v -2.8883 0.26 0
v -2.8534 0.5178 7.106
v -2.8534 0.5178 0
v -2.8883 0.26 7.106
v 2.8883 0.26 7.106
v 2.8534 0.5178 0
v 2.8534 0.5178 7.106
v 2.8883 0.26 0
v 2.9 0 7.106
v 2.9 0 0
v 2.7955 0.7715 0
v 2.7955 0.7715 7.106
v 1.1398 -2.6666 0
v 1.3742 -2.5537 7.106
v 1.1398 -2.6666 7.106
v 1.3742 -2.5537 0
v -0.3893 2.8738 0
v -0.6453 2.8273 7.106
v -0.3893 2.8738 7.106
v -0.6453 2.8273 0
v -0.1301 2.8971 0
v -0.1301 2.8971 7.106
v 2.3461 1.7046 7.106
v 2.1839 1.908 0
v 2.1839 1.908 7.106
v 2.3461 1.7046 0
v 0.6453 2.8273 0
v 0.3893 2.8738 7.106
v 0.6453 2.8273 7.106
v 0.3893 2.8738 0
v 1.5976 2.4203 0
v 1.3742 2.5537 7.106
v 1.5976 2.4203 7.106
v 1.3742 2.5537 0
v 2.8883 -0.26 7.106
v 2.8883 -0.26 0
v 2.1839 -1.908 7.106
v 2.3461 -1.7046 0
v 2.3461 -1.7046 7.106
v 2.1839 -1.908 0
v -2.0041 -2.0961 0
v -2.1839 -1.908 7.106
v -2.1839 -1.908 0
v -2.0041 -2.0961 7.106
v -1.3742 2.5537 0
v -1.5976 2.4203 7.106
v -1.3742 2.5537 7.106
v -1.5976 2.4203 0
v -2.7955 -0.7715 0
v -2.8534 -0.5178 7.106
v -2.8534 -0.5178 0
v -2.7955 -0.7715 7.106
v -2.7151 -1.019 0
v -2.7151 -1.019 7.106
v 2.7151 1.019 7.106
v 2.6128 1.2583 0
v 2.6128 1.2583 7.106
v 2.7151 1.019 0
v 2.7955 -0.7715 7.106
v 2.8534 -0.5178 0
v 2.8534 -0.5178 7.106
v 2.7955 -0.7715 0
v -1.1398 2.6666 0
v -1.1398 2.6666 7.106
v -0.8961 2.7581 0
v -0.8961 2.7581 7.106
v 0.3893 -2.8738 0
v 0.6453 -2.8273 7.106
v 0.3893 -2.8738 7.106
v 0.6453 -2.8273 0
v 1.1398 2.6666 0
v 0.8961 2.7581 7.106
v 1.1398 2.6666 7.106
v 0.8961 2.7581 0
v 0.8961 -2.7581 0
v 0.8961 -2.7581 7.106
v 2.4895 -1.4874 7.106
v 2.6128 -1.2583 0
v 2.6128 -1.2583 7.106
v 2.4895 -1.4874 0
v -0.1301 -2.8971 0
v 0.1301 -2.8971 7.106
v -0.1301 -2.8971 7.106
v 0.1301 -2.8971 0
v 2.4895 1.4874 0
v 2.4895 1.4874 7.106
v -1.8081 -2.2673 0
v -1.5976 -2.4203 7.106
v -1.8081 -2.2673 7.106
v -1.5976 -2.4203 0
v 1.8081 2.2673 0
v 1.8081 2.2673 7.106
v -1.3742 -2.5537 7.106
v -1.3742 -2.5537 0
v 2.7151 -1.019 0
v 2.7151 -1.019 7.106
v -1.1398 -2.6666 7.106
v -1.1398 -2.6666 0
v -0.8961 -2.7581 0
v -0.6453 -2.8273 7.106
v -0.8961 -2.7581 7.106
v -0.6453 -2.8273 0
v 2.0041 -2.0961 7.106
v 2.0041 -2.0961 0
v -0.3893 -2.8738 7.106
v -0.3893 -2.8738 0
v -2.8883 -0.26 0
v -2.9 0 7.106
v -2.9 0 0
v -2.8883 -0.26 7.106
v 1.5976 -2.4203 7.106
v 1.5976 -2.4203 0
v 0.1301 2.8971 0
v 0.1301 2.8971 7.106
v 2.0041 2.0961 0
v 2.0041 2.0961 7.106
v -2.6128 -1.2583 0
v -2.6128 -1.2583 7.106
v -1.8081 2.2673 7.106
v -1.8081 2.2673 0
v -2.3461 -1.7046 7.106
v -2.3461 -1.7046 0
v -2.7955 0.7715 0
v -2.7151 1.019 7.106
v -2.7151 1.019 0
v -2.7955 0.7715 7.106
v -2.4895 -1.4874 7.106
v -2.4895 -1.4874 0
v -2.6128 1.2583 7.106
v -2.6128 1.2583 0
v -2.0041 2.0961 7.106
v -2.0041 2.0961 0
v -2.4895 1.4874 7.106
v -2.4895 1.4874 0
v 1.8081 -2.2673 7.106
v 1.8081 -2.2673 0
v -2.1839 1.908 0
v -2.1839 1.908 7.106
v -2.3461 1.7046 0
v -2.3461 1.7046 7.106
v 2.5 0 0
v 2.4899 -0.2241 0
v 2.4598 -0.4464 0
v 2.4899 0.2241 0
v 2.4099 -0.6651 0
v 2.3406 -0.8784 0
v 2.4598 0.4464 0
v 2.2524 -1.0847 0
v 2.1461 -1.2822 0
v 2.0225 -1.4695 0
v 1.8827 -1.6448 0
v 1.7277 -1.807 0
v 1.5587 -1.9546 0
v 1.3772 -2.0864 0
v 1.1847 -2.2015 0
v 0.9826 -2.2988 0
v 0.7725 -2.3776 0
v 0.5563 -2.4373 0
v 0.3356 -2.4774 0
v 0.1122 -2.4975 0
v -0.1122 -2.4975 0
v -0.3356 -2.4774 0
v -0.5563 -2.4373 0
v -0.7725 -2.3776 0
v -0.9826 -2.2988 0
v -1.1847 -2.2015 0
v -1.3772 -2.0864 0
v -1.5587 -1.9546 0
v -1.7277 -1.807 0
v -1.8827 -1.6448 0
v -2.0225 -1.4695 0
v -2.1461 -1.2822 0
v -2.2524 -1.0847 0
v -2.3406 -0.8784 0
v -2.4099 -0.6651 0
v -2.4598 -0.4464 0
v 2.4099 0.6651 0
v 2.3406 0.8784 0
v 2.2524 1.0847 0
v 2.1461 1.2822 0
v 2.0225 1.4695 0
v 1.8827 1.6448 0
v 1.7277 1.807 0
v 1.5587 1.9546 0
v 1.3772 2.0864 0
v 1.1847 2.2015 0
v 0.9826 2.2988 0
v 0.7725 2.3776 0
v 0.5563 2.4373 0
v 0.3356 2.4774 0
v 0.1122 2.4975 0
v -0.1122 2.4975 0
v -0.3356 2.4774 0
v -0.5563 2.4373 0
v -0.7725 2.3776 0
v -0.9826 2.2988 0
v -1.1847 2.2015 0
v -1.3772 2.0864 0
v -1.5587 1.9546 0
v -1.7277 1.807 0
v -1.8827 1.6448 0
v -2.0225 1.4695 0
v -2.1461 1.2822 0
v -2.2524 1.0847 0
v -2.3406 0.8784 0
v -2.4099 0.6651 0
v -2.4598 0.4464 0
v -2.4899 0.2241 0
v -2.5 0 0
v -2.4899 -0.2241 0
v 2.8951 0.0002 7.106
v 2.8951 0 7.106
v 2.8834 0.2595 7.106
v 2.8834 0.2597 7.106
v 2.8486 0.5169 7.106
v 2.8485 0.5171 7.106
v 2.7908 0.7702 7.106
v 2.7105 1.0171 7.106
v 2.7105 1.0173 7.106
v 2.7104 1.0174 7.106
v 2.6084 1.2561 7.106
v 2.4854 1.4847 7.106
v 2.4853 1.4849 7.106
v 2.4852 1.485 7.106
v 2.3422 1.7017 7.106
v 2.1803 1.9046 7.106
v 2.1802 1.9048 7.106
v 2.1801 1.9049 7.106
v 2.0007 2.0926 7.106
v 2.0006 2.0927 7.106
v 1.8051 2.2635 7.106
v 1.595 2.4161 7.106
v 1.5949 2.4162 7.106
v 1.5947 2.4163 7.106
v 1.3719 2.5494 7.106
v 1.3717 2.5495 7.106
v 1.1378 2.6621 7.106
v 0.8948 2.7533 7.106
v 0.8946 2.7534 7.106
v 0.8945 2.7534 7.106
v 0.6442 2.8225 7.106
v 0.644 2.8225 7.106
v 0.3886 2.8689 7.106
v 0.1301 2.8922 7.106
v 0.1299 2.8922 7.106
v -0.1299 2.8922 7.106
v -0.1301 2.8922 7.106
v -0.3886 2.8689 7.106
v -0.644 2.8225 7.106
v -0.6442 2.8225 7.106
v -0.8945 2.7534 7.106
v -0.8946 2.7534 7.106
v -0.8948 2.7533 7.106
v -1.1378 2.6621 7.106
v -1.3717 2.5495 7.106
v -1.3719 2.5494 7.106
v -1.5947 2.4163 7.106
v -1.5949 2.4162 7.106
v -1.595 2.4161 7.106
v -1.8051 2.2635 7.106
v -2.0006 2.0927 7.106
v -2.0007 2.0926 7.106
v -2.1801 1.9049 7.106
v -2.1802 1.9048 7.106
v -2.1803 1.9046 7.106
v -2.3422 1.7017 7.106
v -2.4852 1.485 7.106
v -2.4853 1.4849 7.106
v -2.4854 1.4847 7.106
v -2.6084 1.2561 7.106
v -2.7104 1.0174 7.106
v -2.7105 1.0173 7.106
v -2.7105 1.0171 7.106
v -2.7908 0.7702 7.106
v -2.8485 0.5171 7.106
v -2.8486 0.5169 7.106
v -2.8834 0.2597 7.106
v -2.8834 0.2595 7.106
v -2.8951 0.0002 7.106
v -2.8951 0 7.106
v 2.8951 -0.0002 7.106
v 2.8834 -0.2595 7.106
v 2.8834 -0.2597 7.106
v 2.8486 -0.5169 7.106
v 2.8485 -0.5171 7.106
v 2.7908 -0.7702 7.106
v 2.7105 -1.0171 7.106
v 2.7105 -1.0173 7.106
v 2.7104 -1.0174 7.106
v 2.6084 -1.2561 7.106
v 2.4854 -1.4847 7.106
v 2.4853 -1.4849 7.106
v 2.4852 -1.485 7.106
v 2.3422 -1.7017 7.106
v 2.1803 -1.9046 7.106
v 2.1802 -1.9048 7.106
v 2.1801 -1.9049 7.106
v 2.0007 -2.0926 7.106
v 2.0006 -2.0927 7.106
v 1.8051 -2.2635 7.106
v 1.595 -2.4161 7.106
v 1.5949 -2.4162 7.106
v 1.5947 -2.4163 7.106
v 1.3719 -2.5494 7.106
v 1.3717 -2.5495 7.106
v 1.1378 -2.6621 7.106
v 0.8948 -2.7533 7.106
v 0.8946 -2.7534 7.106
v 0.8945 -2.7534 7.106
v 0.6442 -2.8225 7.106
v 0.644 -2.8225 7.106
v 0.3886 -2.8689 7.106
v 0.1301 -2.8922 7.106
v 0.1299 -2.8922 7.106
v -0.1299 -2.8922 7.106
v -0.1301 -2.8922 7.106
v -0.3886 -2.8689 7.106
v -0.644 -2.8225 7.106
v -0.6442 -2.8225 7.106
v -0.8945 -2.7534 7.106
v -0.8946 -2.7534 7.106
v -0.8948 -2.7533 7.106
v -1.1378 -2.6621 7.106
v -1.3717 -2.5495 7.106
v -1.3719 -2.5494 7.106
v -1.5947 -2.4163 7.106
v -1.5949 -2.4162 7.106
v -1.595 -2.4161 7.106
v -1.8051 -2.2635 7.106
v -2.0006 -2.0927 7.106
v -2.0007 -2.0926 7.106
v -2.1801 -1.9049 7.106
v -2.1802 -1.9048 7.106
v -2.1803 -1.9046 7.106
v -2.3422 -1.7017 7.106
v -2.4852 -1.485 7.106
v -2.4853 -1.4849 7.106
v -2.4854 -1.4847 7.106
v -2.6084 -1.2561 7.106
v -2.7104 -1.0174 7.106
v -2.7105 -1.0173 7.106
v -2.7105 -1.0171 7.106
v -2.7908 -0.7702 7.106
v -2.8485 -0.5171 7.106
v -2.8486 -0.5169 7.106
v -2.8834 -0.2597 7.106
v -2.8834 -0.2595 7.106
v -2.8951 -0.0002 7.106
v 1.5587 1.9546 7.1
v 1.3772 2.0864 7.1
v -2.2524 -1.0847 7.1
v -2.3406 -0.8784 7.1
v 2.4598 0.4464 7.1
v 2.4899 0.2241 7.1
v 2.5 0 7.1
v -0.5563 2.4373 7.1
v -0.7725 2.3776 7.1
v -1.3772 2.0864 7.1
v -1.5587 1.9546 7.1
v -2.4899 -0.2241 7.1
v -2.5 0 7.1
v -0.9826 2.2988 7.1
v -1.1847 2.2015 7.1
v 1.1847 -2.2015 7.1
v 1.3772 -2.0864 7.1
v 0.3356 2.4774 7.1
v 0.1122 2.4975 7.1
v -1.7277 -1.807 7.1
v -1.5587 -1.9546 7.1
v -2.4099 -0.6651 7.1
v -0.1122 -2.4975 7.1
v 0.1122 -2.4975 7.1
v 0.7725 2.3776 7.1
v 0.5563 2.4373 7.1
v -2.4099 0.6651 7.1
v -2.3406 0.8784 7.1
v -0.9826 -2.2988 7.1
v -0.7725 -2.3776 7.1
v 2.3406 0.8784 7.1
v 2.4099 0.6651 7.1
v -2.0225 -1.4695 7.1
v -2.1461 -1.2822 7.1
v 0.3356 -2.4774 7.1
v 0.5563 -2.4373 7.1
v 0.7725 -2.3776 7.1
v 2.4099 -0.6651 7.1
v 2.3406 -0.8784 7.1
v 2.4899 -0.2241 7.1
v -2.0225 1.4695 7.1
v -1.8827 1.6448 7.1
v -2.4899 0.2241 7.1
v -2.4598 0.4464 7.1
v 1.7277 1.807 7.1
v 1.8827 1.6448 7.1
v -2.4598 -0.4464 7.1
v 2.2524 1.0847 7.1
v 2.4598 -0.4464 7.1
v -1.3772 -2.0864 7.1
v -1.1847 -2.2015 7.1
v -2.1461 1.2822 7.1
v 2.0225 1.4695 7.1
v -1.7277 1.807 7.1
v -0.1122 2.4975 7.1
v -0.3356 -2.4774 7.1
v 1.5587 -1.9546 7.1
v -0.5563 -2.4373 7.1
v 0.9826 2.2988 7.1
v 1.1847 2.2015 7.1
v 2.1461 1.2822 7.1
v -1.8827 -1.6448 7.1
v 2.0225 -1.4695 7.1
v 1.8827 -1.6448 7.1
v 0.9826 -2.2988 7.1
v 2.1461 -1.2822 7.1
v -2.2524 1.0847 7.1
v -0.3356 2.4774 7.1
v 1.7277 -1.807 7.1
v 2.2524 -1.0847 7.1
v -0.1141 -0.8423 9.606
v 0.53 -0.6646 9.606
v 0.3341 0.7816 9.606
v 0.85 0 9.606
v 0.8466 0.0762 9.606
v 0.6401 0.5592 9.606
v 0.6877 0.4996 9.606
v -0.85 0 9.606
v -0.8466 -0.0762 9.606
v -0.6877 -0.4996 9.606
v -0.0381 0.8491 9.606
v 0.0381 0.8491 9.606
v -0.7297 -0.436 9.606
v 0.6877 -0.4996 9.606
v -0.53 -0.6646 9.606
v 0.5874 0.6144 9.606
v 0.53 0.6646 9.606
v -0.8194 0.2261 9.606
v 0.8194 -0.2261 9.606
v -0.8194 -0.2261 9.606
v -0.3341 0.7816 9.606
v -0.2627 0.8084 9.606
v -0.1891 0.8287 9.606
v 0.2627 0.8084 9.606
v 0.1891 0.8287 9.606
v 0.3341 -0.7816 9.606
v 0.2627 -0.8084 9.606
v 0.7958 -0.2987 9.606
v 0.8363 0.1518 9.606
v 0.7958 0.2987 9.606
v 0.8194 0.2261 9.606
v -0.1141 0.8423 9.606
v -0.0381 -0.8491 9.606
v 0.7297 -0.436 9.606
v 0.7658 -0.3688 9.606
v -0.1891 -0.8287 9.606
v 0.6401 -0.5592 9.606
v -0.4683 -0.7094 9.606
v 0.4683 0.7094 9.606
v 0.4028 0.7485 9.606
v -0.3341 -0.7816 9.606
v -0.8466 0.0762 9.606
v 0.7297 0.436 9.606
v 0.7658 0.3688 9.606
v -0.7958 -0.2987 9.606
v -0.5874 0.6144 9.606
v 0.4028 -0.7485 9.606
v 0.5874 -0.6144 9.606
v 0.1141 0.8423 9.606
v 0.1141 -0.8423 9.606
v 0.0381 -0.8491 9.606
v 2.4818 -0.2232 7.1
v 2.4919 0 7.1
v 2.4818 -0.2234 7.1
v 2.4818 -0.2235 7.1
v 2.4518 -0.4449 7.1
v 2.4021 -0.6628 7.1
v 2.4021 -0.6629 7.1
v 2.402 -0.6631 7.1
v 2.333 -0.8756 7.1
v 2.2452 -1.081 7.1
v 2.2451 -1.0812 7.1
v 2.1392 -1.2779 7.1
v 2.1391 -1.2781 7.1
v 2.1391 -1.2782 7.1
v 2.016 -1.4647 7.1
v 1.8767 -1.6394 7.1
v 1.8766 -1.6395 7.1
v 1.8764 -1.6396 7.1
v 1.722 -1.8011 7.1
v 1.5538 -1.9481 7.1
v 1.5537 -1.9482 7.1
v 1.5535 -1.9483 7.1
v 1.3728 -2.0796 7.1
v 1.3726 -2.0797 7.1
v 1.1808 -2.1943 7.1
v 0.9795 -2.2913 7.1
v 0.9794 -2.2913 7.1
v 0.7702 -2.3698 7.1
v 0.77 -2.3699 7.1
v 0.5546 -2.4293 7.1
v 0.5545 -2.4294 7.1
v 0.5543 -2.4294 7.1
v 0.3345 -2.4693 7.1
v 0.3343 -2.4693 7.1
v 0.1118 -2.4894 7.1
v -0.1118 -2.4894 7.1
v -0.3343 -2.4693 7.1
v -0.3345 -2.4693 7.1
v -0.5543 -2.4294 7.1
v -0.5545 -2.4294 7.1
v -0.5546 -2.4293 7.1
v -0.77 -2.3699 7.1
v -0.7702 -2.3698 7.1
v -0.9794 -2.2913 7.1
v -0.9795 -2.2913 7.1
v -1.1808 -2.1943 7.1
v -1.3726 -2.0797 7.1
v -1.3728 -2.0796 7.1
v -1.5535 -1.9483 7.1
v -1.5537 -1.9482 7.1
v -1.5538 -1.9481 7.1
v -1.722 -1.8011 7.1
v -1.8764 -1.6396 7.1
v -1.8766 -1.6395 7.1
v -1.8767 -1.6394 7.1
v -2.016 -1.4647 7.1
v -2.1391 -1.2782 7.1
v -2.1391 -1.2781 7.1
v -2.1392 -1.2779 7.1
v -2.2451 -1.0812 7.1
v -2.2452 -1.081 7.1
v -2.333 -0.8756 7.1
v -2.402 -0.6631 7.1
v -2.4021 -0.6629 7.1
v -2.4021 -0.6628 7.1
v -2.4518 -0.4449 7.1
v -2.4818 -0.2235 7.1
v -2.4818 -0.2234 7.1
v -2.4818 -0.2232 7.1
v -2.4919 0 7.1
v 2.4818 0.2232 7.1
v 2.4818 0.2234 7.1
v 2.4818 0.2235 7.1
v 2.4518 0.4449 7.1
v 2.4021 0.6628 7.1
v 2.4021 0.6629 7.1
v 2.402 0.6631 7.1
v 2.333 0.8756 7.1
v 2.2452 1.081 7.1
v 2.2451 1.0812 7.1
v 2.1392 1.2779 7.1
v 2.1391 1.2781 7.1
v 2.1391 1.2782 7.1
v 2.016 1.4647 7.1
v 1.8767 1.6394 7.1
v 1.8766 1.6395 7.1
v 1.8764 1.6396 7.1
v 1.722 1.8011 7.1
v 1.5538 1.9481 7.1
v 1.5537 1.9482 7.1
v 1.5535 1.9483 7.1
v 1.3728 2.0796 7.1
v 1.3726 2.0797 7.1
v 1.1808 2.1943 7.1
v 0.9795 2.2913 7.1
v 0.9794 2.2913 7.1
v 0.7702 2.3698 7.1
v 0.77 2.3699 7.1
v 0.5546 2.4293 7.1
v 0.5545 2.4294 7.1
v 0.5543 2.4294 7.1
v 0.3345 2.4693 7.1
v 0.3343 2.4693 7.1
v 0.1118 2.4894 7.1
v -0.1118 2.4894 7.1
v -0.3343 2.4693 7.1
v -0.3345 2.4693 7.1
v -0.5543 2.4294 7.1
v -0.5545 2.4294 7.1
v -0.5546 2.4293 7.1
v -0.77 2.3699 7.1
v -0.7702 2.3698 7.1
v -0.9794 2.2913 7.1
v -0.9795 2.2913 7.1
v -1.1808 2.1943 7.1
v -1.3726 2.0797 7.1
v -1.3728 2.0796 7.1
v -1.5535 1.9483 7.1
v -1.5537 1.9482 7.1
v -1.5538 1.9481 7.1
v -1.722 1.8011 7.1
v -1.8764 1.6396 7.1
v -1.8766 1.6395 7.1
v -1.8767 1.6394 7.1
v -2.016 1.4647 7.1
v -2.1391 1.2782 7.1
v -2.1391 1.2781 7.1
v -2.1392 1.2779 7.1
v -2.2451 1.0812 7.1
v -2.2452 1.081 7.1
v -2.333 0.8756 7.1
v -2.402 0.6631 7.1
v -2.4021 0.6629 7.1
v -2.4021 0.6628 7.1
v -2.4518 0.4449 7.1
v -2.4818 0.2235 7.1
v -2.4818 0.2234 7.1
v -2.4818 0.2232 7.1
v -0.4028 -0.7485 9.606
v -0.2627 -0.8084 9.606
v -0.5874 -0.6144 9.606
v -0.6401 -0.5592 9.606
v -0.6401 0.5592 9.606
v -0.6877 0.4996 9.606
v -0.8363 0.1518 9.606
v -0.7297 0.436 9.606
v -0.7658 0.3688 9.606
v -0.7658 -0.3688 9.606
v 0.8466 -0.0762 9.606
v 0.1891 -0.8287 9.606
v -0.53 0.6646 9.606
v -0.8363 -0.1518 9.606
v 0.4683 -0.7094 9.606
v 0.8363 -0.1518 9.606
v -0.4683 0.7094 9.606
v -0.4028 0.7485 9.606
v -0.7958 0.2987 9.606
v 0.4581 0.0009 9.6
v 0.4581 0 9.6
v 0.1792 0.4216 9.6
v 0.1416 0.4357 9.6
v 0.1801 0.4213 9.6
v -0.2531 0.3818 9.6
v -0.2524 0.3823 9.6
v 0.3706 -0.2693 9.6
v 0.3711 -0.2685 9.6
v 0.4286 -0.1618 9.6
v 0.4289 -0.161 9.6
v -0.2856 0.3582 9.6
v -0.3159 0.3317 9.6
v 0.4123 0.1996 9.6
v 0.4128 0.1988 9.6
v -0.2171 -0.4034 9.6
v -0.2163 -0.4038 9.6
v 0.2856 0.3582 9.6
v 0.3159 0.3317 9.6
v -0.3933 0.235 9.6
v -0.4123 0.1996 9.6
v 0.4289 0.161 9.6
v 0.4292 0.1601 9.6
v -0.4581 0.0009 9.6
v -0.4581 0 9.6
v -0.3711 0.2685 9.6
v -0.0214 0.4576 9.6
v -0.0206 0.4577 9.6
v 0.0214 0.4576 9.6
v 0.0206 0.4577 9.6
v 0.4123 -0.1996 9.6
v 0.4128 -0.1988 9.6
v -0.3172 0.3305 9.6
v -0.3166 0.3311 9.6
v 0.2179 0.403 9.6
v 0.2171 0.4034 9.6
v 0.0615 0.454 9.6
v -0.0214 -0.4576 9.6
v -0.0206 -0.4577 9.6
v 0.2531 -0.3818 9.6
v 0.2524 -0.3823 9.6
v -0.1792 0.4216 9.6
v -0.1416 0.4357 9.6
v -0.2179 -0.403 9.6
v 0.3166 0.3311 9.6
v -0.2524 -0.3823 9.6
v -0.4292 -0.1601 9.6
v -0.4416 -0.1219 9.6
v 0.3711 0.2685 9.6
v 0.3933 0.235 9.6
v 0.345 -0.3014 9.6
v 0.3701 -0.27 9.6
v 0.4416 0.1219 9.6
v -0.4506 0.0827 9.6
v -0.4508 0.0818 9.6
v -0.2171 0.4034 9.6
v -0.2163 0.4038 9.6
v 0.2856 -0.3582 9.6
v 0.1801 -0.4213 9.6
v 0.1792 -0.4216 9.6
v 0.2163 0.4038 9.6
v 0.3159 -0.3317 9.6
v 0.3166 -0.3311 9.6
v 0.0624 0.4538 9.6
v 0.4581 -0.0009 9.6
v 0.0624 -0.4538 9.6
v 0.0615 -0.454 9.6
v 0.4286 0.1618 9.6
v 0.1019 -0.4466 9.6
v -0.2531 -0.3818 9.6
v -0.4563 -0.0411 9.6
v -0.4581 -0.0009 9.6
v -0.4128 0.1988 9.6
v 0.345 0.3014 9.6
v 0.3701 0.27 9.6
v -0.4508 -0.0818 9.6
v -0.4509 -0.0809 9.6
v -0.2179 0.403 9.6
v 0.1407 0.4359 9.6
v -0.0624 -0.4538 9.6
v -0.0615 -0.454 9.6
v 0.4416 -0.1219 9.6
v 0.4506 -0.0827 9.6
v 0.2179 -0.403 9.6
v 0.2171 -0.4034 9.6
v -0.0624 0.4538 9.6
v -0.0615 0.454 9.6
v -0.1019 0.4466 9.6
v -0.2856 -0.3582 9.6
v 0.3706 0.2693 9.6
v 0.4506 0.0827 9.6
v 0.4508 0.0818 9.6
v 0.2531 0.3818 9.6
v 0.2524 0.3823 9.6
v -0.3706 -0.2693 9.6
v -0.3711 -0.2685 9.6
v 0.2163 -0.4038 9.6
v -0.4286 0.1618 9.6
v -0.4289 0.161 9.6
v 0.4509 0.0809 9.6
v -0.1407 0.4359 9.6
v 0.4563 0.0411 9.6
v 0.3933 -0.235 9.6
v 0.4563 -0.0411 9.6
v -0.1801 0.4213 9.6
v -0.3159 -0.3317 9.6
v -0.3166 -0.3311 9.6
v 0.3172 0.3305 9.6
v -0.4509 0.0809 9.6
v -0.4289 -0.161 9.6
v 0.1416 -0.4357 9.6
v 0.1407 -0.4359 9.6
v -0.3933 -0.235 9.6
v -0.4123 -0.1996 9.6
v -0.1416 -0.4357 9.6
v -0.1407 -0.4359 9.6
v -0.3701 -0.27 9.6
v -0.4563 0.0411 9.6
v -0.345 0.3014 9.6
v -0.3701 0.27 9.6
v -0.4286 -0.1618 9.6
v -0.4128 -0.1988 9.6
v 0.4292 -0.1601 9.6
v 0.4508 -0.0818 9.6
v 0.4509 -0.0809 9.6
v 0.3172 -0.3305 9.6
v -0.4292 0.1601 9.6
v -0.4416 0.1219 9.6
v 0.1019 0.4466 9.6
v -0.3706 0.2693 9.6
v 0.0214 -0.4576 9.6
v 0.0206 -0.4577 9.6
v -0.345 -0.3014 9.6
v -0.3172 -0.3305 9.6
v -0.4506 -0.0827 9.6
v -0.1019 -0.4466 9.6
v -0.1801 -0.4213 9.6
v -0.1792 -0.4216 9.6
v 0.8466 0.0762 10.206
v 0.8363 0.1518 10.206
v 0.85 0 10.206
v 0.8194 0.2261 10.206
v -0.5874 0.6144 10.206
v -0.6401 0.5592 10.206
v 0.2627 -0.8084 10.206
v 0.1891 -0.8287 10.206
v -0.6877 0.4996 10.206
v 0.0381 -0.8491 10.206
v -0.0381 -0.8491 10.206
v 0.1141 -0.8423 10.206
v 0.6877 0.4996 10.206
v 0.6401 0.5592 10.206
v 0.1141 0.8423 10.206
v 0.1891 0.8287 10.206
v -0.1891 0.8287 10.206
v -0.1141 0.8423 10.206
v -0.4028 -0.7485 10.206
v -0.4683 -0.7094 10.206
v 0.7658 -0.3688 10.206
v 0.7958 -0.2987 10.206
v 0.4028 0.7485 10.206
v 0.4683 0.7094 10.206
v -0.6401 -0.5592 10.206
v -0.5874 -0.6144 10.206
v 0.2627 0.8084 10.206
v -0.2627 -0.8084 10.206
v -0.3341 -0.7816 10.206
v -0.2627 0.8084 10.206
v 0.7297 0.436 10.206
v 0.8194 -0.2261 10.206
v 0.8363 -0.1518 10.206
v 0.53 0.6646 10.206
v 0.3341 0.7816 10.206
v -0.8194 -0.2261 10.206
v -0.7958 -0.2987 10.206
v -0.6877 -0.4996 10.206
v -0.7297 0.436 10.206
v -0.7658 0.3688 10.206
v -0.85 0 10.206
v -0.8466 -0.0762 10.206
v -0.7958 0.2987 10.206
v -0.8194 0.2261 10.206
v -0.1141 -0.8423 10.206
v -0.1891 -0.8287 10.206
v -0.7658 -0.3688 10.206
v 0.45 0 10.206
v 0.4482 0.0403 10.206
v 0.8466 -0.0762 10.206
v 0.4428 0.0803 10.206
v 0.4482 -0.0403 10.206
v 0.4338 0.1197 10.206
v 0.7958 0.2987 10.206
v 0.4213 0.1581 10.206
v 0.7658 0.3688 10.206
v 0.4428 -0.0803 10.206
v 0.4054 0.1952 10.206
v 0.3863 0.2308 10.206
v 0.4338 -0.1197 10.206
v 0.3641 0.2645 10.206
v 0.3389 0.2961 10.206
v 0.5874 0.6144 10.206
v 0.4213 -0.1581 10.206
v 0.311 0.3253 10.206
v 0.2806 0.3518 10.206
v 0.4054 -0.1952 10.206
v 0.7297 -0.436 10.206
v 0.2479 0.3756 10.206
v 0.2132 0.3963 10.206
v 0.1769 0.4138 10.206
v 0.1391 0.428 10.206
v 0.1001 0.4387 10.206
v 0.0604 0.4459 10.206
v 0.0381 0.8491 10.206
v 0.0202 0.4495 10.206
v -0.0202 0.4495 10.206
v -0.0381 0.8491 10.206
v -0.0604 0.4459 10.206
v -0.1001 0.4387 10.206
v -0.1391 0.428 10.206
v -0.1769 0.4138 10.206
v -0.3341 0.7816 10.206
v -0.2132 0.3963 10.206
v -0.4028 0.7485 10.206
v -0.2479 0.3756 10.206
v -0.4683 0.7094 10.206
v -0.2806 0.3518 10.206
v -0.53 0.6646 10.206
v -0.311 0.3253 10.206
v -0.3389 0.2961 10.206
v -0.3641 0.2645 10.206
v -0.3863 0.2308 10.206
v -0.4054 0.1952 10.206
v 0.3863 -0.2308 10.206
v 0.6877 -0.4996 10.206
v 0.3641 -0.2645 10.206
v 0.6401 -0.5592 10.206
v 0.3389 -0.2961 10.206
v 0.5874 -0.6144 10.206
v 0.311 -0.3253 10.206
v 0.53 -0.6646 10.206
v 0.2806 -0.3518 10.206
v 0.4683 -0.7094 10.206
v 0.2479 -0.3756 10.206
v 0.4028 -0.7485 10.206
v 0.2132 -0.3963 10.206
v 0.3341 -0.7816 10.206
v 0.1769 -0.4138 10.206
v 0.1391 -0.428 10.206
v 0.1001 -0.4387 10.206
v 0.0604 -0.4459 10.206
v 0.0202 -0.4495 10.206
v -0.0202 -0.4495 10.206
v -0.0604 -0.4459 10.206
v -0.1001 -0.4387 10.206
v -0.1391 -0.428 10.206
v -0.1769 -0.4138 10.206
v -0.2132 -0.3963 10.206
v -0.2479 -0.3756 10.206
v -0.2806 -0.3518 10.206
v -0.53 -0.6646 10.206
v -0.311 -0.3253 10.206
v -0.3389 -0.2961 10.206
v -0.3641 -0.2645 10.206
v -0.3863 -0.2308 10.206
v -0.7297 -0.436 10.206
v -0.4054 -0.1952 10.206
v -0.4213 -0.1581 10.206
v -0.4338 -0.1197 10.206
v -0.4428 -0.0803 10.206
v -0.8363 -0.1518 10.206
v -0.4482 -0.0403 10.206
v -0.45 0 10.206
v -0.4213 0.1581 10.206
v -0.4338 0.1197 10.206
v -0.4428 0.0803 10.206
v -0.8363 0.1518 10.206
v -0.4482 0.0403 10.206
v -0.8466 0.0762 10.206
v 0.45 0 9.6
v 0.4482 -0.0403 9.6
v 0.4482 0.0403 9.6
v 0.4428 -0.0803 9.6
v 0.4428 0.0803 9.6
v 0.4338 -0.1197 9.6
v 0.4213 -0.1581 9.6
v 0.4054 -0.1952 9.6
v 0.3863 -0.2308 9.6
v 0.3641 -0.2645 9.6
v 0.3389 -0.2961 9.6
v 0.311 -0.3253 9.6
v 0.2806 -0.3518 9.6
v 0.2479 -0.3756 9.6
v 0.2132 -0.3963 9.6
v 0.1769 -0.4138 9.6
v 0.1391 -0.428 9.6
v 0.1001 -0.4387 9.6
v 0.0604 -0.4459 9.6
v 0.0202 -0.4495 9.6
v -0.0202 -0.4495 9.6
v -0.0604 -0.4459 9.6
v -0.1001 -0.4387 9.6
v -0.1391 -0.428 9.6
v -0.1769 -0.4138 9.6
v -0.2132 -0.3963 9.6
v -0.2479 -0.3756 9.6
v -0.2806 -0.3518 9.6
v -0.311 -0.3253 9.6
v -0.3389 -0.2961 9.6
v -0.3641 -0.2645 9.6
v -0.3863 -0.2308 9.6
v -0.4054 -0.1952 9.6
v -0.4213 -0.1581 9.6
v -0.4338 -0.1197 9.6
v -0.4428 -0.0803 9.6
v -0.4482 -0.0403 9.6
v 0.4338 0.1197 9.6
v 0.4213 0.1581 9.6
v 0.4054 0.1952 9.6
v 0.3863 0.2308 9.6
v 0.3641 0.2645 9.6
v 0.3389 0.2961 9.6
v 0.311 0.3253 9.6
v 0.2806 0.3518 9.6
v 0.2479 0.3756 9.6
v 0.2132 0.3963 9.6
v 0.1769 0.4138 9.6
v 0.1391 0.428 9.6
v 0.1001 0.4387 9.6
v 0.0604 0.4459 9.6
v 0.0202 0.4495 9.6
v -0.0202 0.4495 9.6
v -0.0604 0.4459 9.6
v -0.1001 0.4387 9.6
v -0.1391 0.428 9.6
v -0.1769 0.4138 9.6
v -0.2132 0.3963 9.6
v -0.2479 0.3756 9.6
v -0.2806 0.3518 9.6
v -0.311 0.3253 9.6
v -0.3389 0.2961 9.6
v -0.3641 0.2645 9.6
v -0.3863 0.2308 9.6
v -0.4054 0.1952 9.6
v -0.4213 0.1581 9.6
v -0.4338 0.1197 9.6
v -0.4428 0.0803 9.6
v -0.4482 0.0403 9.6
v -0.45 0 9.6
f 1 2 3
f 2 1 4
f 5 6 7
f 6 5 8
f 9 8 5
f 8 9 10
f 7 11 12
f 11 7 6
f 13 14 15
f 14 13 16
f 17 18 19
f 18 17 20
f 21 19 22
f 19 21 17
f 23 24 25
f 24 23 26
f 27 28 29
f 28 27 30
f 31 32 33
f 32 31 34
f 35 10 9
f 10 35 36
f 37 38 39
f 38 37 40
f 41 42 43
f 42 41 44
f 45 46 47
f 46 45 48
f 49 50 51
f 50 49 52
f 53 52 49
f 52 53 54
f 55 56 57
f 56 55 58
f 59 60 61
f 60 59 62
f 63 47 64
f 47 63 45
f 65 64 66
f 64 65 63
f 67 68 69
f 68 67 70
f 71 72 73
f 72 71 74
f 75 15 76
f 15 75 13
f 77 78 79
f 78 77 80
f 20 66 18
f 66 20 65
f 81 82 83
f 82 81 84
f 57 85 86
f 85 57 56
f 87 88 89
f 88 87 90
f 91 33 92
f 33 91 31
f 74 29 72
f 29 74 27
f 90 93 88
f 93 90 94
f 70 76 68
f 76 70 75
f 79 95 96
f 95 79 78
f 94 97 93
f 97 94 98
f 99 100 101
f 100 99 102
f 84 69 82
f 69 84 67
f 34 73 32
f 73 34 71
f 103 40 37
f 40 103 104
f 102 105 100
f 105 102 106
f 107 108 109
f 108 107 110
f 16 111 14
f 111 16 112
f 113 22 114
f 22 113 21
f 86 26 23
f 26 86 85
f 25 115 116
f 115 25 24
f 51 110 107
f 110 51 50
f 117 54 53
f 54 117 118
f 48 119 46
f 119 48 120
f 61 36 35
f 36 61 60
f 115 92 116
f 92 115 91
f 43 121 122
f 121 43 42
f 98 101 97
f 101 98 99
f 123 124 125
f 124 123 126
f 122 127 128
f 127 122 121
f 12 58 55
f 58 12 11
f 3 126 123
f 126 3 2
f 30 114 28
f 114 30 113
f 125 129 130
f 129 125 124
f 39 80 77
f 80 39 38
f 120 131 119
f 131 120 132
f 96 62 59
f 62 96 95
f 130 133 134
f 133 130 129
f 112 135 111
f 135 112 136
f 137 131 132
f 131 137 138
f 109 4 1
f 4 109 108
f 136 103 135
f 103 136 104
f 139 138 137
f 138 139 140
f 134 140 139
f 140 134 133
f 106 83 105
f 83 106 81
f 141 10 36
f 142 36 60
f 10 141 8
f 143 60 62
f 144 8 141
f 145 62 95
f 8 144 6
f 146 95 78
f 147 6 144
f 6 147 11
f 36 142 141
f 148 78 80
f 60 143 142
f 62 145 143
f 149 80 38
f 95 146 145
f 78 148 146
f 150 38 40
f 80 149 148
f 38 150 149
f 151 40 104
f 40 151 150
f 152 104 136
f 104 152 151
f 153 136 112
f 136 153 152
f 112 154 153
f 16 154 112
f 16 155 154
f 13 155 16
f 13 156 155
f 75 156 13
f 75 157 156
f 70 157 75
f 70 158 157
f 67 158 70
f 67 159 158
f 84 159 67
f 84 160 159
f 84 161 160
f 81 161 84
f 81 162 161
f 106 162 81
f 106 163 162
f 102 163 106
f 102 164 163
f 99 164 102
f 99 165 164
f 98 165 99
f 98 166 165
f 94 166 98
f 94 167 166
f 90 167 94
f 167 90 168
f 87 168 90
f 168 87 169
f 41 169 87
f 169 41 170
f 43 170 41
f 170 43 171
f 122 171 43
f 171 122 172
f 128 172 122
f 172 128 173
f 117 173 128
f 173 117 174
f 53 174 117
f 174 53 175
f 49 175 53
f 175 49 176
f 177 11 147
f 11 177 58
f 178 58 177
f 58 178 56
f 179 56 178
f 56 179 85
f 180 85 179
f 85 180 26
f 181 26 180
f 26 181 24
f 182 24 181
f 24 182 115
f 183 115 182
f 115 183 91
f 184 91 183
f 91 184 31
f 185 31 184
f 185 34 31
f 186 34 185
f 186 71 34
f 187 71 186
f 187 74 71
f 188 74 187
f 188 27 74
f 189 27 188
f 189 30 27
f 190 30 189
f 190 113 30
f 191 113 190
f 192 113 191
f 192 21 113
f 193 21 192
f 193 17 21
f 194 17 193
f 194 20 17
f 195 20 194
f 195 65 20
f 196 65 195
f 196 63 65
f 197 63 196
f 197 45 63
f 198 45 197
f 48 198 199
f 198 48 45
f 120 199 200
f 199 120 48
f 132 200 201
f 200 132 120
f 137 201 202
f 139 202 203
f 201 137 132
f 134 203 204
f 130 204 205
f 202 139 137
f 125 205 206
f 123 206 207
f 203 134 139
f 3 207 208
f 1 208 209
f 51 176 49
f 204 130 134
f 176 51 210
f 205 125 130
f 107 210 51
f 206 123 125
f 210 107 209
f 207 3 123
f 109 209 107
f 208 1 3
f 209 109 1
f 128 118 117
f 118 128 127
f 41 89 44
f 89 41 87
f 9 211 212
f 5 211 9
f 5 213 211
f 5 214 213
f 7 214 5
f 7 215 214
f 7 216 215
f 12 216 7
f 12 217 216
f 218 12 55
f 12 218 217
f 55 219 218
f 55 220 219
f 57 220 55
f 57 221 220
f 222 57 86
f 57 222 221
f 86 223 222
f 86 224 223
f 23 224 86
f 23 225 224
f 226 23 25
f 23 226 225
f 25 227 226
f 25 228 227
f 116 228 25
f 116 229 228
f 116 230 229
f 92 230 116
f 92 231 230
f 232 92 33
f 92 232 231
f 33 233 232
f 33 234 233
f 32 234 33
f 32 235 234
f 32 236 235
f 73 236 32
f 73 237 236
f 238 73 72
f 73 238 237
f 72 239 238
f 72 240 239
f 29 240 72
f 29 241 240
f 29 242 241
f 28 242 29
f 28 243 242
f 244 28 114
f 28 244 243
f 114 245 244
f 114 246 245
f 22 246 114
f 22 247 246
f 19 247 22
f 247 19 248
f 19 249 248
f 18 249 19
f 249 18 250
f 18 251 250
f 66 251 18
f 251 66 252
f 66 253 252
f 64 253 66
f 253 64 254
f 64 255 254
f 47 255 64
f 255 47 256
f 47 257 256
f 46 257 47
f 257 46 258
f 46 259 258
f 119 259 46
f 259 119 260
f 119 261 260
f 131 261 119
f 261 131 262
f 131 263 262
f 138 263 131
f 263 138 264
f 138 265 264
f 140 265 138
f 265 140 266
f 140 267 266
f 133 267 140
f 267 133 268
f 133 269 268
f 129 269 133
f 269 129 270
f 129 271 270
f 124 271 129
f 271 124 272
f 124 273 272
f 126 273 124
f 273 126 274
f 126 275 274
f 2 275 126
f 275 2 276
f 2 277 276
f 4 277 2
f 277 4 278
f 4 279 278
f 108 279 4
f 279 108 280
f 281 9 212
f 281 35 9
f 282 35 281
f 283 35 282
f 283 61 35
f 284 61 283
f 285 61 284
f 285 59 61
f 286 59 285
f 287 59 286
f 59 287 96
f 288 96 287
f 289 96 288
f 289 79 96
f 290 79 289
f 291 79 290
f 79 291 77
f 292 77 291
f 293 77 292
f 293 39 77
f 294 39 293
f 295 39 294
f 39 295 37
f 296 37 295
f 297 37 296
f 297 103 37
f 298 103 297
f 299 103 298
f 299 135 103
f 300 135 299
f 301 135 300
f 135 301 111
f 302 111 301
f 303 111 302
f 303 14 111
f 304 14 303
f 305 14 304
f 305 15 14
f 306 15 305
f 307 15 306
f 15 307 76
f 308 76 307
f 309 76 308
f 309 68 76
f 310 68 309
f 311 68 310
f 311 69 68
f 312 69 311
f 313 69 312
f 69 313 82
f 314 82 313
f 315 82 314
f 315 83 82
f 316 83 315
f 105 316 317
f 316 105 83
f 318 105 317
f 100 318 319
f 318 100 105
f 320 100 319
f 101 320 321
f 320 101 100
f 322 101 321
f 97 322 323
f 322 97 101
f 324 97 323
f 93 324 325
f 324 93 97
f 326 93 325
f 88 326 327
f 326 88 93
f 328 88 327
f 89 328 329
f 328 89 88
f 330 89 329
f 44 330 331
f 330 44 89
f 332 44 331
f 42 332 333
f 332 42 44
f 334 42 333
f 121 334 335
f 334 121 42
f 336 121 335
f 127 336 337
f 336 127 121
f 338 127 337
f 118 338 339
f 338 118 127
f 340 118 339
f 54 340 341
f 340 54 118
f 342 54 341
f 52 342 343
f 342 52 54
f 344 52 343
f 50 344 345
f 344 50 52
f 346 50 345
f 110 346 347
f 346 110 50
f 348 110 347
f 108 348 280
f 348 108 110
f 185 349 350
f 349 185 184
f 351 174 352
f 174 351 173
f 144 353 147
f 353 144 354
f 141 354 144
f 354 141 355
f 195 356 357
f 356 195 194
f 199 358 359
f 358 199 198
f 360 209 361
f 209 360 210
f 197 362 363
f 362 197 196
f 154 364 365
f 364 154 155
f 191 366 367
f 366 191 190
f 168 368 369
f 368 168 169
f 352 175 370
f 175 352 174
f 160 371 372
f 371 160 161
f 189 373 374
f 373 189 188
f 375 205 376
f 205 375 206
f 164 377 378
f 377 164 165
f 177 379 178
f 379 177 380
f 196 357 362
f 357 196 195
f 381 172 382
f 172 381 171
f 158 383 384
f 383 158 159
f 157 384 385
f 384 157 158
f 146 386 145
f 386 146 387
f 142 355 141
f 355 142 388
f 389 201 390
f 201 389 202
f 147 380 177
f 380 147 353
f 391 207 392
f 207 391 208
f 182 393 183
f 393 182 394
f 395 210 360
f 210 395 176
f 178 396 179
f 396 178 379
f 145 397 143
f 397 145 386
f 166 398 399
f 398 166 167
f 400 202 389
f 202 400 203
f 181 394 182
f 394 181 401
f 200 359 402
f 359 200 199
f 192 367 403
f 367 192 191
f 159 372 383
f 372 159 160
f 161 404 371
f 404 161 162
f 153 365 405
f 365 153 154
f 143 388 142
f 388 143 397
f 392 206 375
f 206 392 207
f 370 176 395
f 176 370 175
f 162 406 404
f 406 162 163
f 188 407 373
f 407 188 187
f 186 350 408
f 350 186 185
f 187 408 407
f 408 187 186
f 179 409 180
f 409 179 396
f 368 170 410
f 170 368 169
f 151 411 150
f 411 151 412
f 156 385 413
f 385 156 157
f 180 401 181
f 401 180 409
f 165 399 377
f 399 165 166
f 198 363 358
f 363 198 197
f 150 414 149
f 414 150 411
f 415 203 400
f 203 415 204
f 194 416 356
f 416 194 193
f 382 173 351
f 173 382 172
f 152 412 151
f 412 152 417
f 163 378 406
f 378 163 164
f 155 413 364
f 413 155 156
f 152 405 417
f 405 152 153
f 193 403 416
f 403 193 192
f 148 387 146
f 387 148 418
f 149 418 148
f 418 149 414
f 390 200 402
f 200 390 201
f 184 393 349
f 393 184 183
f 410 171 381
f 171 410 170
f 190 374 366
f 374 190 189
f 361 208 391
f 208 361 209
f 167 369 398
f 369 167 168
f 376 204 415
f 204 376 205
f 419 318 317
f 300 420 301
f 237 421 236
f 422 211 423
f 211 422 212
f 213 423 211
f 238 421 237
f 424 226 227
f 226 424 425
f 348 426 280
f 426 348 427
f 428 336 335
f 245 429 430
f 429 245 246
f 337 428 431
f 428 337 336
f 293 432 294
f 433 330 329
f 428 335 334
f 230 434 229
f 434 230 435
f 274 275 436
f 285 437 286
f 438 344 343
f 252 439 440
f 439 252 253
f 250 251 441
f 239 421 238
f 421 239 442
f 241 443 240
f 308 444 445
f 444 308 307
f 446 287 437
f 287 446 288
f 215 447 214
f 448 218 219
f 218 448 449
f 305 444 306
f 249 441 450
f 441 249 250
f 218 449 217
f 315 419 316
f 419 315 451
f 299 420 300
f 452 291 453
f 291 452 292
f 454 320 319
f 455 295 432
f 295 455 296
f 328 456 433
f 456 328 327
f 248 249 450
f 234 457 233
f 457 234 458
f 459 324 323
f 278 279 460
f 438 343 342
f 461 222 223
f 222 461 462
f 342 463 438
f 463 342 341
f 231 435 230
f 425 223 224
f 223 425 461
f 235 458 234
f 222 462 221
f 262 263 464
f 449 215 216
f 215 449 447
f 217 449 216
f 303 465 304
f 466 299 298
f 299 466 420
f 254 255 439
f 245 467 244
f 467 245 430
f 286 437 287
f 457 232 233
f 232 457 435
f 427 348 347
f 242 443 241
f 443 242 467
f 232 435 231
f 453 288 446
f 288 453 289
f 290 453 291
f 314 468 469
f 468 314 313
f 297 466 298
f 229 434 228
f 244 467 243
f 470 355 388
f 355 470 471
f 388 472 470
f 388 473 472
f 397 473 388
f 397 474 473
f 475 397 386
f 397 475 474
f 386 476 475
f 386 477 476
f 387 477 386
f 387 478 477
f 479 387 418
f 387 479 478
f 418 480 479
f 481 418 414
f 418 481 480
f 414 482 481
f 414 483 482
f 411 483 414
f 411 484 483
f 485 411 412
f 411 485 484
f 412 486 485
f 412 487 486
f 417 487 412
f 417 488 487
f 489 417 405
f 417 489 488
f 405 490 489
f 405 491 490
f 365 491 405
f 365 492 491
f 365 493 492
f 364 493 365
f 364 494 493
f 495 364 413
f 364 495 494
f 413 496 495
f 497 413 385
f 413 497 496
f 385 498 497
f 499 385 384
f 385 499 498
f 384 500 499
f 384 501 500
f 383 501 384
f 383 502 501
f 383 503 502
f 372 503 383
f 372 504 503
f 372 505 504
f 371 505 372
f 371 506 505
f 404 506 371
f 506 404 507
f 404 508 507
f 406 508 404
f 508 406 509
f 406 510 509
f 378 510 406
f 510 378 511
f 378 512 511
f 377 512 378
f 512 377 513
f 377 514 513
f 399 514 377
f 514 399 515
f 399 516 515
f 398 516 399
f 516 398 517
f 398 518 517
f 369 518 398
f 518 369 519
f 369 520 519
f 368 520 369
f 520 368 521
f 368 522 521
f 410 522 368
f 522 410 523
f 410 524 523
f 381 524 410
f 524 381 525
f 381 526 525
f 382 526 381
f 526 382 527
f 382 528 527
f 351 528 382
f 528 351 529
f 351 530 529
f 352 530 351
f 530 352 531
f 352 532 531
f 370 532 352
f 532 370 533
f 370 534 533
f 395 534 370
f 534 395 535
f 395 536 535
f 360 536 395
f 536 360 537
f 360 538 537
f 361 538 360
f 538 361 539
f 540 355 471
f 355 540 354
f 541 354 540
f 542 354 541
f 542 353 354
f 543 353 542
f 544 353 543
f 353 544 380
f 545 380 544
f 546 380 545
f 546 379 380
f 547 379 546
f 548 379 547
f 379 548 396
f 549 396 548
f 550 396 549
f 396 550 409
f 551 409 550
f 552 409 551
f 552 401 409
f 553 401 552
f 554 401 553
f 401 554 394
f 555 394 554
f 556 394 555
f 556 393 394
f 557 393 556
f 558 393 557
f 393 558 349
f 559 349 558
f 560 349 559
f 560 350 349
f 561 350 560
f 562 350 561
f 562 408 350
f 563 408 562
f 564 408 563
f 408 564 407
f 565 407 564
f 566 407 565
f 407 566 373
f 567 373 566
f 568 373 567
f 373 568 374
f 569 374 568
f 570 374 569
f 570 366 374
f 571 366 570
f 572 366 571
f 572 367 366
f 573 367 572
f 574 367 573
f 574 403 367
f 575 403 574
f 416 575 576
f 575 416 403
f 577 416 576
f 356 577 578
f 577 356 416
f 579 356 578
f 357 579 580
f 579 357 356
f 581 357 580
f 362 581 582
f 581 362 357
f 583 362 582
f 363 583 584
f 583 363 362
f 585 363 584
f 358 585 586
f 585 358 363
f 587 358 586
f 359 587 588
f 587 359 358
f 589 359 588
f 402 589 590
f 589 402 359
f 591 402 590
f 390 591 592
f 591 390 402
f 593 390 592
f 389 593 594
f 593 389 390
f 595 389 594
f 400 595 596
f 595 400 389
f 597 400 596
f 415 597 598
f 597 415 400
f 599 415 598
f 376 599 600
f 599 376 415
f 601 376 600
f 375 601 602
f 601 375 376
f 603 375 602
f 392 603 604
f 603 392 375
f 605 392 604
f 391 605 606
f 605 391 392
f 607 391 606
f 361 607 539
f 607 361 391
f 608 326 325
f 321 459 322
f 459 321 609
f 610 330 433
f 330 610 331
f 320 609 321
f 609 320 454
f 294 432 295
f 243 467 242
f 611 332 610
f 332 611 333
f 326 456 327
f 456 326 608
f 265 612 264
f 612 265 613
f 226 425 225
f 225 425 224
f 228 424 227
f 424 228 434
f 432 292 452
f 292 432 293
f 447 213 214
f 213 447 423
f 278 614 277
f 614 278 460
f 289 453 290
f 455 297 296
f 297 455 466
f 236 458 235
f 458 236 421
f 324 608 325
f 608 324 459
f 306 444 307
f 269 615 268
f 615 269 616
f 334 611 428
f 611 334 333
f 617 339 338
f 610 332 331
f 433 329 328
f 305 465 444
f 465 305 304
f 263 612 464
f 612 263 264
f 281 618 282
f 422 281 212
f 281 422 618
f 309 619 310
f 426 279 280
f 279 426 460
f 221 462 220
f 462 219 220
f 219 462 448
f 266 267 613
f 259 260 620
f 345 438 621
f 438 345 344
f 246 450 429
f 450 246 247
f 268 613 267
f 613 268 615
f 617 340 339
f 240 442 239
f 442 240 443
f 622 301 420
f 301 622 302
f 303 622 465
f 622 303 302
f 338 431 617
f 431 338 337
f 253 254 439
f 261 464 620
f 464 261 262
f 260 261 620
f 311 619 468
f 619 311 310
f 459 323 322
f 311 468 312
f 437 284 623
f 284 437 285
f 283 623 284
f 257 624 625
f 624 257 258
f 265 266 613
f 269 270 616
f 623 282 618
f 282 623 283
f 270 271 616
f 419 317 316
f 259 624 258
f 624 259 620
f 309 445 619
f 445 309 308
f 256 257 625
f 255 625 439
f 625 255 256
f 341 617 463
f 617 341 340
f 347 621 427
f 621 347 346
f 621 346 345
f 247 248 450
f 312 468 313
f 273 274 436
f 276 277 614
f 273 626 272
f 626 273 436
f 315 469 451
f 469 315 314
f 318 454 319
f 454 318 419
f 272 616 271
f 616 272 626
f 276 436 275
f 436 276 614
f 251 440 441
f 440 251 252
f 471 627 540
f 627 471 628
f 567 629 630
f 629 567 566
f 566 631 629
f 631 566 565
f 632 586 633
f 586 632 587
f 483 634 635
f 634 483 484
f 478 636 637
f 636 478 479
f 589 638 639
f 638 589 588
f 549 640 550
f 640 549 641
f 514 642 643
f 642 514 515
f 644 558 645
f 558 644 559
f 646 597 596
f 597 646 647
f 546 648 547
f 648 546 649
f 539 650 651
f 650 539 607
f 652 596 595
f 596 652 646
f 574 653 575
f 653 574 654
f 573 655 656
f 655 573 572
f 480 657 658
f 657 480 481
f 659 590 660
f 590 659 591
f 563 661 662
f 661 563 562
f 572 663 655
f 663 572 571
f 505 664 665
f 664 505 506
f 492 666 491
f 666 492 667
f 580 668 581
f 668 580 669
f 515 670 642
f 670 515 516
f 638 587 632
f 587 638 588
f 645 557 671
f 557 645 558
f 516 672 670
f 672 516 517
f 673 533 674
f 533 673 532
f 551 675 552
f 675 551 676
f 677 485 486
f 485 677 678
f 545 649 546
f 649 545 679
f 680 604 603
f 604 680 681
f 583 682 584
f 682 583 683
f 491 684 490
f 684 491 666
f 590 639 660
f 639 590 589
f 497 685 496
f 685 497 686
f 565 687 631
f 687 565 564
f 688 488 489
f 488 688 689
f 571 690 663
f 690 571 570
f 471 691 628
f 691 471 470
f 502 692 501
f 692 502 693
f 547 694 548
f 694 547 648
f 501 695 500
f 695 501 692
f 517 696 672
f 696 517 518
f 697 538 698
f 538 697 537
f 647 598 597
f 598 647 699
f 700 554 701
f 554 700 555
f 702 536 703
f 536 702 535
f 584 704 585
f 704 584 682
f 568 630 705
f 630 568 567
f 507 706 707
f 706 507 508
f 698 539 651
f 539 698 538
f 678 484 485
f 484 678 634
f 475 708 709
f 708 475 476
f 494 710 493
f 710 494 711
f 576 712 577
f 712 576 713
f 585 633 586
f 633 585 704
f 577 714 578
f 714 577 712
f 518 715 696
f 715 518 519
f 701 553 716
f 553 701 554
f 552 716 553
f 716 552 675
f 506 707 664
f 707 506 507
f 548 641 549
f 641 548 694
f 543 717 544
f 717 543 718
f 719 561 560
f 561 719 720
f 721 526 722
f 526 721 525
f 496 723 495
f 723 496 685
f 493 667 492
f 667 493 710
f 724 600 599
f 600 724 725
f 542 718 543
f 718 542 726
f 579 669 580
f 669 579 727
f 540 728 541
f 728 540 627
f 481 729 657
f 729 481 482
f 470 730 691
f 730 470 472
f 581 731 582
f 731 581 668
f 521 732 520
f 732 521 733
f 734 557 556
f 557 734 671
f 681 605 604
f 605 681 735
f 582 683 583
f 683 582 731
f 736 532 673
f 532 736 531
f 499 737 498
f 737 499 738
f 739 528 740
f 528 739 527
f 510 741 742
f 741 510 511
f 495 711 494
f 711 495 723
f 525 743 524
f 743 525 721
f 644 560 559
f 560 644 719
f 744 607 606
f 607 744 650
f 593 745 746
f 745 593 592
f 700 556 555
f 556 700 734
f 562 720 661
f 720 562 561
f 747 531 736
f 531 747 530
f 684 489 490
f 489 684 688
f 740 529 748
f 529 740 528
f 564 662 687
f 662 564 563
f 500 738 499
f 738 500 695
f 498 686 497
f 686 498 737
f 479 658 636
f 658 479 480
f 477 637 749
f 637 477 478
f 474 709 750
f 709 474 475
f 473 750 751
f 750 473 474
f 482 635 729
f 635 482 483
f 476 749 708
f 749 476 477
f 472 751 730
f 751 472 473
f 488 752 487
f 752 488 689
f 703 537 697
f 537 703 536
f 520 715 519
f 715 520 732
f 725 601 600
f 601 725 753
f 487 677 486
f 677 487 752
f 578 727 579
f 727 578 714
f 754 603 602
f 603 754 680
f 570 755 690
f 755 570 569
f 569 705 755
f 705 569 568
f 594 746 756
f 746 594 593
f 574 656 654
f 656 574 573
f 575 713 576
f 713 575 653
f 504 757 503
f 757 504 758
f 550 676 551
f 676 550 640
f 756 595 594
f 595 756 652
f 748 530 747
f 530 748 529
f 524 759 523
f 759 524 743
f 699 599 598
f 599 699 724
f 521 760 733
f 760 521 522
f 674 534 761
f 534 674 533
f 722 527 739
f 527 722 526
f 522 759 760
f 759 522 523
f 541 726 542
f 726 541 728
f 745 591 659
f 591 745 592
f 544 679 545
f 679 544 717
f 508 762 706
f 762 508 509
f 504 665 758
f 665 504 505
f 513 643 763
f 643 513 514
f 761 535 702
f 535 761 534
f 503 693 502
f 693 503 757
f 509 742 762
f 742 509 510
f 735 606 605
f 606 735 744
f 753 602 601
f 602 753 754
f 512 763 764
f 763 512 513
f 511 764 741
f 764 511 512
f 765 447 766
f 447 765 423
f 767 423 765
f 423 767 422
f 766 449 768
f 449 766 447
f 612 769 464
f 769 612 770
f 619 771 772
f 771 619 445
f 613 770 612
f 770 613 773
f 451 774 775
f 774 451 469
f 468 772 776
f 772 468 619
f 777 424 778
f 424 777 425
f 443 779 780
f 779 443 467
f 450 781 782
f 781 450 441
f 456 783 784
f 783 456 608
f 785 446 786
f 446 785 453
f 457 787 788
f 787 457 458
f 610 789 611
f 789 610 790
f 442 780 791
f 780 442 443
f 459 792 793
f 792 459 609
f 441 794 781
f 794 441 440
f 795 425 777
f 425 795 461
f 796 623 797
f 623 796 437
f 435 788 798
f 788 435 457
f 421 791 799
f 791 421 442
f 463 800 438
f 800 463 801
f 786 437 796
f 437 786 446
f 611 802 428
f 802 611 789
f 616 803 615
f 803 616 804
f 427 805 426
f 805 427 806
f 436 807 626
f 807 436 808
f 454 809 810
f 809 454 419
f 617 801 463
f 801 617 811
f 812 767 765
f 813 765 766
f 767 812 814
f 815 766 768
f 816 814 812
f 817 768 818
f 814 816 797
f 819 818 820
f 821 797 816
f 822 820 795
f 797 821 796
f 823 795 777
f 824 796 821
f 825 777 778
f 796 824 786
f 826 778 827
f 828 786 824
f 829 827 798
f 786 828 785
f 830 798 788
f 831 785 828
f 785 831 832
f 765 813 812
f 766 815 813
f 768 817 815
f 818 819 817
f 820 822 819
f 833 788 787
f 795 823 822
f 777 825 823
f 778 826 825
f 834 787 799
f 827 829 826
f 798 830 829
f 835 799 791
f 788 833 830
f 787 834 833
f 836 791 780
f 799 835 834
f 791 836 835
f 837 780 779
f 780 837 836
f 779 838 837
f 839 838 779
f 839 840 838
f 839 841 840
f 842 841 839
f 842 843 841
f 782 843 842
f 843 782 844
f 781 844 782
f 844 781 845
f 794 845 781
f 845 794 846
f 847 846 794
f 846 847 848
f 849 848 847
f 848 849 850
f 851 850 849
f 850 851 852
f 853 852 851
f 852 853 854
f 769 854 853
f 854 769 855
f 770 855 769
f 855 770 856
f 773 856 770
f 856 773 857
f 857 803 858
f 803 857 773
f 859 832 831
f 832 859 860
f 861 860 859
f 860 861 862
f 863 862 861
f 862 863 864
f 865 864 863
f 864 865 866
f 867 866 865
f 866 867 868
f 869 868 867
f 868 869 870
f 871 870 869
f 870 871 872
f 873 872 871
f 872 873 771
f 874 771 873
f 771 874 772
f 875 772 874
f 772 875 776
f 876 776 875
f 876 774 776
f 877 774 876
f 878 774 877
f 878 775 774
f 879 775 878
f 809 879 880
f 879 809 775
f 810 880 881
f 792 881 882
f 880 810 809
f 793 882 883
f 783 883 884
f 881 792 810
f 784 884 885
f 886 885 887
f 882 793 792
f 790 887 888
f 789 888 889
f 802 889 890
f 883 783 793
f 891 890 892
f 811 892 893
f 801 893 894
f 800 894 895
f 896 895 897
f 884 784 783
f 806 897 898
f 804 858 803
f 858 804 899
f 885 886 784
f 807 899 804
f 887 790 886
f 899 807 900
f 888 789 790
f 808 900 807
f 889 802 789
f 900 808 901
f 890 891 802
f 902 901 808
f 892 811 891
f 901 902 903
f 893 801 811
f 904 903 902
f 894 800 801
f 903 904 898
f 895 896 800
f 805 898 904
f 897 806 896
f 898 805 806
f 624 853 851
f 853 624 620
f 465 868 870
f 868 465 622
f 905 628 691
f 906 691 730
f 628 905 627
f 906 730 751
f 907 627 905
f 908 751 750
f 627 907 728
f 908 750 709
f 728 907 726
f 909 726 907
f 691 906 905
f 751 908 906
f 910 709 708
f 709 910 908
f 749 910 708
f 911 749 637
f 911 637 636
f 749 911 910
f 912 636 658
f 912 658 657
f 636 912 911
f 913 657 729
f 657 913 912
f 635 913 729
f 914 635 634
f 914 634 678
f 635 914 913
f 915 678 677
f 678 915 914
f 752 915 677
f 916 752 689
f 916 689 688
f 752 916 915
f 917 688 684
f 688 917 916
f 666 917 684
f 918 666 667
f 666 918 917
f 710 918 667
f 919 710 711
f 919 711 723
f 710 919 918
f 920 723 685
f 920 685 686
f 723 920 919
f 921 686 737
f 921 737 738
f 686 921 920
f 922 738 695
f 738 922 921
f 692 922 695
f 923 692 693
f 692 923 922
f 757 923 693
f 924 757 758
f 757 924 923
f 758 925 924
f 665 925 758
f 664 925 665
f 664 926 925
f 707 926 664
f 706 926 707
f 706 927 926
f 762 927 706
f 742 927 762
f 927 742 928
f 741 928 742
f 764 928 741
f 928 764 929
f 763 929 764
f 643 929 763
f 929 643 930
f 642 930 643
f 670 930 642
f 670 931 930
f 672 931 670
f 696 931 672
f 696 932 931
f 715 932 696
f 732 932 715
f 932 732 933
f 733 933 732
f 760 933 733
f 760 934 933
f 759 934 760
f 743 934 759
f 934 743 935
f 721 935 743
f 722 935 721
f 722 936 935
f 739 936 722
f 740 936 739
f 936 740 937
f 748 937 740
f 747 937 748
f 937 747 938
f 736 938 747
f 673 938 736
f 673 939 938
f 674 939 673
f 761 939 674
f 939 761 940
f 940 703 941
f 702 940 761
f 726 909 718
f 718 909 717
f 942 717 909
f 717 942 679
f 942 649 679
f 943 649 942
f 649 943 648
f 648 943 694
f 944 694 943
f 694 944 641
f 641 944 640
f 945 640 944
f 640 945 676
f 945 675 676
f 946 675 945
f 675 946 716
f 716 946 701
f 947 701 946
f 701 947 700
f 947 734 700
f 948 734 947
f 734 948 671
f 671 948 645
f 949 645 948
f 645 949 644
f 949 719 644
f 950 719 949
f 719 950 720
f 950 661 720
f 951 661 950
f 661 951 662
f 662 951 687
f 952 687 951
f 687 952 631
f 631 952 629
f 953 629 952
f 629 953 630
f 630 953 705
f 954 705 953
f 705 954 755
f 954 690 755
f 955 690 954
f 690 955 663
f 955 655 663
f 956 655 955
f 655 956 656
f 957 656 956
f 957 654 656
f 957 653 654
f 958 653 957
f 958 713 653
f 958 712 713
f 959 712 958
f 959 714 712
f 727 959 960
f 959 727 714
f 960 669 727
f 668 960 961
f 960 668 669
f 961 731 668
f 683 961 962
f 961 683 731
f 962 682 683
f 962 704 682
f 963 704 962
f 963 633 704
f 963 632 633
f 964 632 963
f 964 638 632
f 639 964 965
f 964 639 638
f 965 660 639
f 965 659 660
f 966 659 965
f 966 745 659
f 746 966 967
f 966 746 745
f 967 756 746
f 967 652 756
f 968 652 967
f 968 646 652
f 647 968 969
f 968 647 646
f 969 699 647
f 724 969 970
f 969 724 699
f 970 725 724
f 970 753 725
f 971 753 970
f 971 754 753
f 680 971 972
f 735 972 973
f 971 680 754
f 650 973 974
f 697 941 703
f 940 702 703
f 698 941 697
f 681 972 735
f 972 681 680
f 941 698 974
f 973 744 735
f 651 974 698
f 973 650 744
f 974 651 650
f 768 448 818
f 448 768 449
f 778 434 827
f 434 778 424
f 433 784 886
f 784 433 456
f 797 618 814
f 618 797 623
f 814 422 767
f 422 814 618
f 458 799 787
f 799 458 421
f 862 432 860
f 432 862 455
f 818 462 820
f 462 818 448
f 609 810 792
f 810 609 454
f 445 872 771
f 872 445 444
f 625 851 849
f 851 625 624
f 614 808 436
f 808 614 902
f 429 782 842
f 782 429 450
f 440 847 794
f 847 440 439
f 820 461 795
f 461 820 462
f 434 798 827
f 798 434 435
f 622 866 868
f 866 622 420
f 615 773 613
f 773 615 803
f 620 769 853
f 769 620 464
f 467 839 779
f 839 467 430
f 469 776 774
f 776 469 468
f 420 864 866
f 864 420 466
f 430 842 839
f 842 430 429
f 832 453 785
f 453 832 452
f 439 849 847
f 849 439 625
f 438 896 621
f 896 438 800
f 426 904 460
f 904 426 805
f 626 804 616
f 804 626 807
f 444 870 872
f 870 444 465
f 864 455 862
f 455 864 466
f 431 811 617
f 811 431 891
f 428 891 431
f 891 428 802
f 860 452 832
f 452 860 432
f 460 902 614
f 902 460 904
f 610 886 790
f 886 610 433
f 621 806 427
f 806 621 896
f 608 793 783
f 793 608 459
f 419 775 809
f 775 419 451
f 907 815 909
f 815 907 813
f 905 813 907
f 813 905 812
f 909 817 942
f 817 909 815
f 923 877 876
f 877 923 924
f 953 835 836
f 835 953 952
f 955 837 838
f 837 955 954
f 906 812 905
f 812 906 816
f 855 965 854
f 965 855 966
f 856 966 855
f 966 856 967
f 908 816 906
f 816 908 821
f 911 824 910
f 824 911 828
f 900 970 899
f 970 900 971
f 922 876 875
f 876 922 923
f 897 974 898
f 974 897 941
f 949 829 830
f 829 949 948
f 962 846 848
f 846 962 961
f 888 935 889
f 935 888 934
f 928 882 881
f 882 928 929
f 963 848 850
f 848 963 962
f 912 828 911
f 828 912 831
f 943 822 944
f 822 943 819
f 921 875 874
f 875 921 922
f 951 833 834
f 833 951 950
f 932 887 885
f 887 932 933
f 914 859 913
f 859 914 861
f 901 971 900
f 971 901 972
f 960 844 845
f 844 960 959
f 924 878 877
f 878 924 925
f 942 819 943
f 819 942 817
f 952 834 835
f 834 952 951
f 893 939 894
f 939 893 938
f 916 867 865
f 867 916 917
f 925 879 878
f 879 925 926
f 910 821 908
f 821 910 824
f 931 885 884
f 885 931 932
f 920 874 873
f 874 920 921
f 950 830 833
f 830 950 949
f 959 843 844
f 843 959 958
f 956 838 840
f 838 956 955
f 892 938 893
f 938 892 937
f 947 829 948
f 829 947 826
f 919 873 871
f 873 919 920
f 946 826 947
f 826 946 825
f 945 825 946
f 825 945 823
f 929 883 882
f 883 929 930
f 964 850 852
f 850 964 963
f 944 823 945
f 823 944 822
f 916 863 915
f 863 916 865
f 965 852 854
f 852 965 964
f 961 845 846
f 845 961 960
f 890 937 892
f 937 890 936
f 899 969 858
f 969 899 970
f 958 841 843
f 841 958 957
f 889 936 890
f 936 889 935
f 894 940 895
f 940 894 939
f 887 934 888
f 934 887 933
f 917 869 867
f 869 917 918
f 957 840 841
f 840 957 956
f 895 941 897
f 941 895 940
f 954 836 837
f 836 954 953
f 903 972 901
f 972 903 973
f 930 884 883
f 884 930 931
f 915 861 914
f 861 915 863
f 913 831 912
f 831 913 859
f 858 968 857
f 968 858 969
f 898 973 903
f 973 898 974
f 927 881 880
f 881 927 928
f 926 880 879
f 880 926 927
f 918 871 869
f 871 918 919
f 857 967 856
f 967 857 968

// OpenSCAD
// file: ProbeTipProtectLib.scad
////////////////////////////////////////////////////////////////
// Scope probe tip protection
// By Nuno João from https://EmbeddedDreams.com
// Released 2020 under Creative Commons 3.0
//
// This creates a cover to protect a scope's probe tip from
// shorting to nearby components when probing a board.
// Scope probes include this accessory, but it can be lost,
// and is tipically larger than I would like them to be...
//


// Parameter defaults are for Rigol RP2200 probes.
module ProbeTipProtection (
        InnerDiameter = 5.00,
        BodyLength = 7.10,
        ConeLength = 2.50,
        TipLength = 0.80,
        TipHoleDiameter = 0.90,
        WallThickness = 0.4
)  {
    // Precalcs and other constants
    cType = 0;
    cHeight = 1;
    cDiameter = 2;
    cPreviousDiameter = 3;
    cSmoothness = 70;

    // Tip definition, by vertical segments. Types:
    //  0: cylinder
    //  1: cone, a linear transition between 2 adjacent segments
    //  2: flat, diameter is a center hole's diameter
    cSegments = [
    //  type  height       in/hole-diam      prevDiam
        [ 0,  BodyLength,  InnerDiameter                   ],
        [ 1,  ConeLength,  TipHoleDiameter,  InnerDiameter ],
        [ 0,   TipLength,  TipHoleDiameter                 ],
    ];

    // OpenSCAD's stupid concept of "variable" forces me to this (and more):
    function GetBaseHeight(idx) =
        idx < 0 ?
            0 :
            (cSegments[idx][cHeight] + GetBaseHeight(idx - 1));

    limit = len(cSegments) - 1;
    for (idx = [0 : limit])  {
        section = cSegments[idx];
        type = section[cType];
        height = section[cHeight];
        diameter = section[cDiameter];
        fn = cSmoothness;

        if (height > 0.0)  {
            if (type == 0)  {
                translate([0, 0, GetBaseHeight(idx-1)])
                    difference()  {
                        cylinder(h = height+0.006, d = diameter + WallThickness*2, $fn=fn);
                        translate([0, 0, -0.01])
                            cylinder(h = height * 0.01 + 0.02, d = diameter, $fn=fn);
                            cylinder(h = height + 0.02, d = diameter, $fn=fn);
                    }
            }
            else if (type == 1)  {
                prevDiam = section[cPreviousDiameter];
                outDiam = diameter + WallThickness*2;
                outPrevDiam = prevDiam + WallThickness*2;
                translate([0, 0, GetBaseHeight(idx-1)])
                    difference()  {
                        cylinder(h = height+0.006, d1 = outPrevDiam, d2 = outDiam, $fn=fn);
                        translate([0, 0, -0.01])
                            cylinder(h = height + 0.02, d1 = prevDiam,
                                                        d2 = diameter, $fn=fn);
                    }
            }
            else if (type == 2)  {
                holeDiam = section[cDiameter2];
                echo("hole diam: ", holeDiam);
                translate([0, 0, GetBaseHeight(idx-1) - WallThickness])
                    difference()  {
                        // The flat top slab
                        cylinder(h = WallThickness+0.006, d = diameter + 0.6, $fn=fn);
                        // Hole in the center
                        translate([0, 0, -0.005])
                            cylinder(h = WallThickness*2 + 0.01, d = holeDiam, $fn=fn);
                    }
            }
            else  {
                echo("***** UPS!! Unkonwn type!");
            }
        }
    }
}


/// Test
//ProbeTipProtection();
// main file
include <ProbeTipProtectLib.scad>;

// Build it!
ProbeTipProtection(
        InnerDiameter = 5.00,
        BodyLength = 7.10,
        ConeLength = 2.50,
        TipLength = 0.60,
        TipHoleDiameter = 0.90
);
